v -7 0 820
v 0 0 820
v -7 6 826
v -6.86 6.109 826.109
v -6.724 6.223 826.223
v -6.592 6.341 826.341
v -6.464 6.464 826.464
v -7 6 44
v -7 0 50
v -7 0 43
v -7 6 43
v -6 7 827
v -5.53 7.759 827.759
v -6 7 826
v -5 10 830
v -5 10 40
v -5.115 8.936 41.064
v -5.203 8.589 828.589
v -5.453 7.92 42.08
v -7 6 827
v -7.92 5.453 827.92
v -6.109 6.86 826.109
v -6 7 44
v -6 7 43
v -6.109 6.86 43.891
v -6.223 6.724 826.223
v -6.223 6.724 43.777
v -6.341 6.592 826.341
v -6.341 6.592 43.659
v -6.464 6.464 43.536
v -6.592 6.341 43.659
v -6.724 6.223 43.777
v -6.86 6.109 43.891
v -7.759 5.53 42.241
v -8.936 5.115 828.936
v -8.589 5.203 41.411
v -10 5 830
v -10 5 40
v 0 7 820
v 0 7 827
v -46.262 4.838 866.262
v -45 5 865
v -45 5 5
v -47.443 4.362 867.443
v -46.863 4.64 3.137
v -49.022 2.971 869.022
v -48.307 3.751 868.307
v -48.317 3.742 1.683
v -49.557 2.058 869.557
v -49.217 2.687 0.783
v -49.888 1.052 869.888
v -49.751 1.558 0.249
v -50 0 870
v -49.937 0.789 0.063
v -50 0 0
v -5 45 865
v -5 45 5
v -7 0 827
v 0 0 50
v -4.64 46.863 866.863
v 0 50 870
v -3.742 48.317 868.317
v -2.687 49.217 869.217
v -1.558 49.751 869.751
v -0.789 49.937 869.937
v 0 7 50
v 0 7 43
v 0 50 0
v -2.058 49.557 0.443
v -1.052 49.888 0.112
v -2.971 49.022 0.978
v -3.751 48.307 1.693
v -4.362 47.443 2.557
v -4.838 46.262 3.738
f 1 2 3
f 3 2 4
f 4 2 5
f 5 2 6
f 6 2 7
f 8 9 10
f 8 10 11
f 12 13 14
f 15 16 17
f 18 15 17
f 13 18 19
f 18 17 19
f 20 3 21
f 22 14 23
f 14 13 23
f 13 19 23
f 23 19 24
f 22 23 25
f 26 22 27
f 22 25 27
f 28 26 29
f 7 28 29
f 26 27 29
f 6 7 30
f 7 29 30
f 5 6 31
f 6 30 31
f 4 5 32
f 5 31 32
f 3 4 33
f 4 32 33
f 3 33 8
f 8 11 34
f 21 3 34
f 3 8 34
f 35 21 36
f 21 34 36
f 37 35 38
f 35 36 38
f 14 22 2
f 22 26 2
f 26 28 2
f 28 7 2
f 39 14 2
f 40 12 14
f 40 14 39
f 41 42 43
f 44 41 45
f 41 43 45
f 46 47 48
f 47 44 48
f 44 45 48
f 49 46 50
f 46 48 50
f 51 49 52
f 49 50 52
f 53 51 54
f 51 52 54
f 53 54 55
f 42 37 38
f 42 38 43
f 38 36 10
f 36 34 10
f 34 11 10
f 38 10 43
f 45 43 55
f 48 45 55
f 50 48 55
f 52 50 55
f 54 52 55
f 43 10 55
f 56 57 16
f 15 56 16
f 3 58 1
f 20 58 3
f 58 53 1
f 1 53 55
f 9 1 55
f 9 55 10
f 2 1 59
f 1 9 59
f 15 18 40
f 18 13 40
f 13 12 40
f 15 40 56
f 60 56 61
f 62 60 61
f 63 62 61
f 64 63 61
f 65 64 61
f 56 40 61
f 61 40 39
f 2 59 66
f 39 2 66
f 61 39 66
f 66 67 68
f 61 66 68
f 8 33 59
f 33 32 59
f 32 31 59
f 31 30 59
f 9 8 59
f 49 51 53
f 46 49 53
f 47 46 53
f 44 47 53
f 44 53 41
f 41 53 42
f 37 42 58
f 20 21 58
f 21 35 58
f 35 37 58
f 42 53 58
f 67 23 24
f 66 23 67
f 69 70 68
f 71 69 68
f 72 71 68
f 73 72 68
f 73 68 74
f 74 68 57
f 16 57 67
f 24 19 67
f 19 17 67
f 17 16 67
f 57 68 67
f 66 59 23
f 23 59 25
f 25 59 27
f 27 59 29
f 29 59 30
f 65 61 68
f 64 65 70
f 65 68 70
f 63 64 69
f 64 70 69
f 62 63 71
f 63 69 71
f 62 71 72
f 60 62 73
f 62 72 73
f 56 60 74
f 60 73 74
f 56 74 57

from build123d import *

# Parameters (mm, degrees)
F1_DEPTH = 870
F6_DEPTH = 7
F7_DEPTH = 7


with BuildPart() as f1:
    # F0 (on Top) → F1 (new body)
    with BuildSketch(Plane.XY):
        with BuildLine():
            Line((-50, 0), (0, 0))
            Line((0, 0), (0, 50))
            ThreePointArc((0, 50), (-3.535534, 48.535534), (-5, 45))
            Line((-5, 45), (-5, 10))
            ThreePointArc((-5, 10), (-6.464466, 6.464466), (-10, 5))
            Line((-10, 5), (-45, 5))
            ThreePointArc((-45, 5), (-48.535534, 3.535534), (-50, 0))
        make_face()
    extrude(amount=F1_DEPTH)

    # F3 (on face) + F4 (on face) → F6 (cut)
    with BuildSketch(Plane.YZ):
        Polygon((0, 820), (50, 870), (0, 870), align=None)
    with BuildSketch(Plane.YZ):
        Polygon((0, 0), (50, 0), (0, 50), align=None)
    extrude(amount=-F6_DEPTH, mode=Mode.SUBTRACT)

    # F2 (on face) → F7 (cut)
    with BuildSketch(Plane.XZ):
        Polygon((0, 870), (-50, 870), (0, 820), align=None)
        Polygon((0, 50), (-50, 0), (0, 0), align=None)
    extrude(amount=-F7_DEPTH, mode=Mode.SUBTRACT)


solid = f1.part
